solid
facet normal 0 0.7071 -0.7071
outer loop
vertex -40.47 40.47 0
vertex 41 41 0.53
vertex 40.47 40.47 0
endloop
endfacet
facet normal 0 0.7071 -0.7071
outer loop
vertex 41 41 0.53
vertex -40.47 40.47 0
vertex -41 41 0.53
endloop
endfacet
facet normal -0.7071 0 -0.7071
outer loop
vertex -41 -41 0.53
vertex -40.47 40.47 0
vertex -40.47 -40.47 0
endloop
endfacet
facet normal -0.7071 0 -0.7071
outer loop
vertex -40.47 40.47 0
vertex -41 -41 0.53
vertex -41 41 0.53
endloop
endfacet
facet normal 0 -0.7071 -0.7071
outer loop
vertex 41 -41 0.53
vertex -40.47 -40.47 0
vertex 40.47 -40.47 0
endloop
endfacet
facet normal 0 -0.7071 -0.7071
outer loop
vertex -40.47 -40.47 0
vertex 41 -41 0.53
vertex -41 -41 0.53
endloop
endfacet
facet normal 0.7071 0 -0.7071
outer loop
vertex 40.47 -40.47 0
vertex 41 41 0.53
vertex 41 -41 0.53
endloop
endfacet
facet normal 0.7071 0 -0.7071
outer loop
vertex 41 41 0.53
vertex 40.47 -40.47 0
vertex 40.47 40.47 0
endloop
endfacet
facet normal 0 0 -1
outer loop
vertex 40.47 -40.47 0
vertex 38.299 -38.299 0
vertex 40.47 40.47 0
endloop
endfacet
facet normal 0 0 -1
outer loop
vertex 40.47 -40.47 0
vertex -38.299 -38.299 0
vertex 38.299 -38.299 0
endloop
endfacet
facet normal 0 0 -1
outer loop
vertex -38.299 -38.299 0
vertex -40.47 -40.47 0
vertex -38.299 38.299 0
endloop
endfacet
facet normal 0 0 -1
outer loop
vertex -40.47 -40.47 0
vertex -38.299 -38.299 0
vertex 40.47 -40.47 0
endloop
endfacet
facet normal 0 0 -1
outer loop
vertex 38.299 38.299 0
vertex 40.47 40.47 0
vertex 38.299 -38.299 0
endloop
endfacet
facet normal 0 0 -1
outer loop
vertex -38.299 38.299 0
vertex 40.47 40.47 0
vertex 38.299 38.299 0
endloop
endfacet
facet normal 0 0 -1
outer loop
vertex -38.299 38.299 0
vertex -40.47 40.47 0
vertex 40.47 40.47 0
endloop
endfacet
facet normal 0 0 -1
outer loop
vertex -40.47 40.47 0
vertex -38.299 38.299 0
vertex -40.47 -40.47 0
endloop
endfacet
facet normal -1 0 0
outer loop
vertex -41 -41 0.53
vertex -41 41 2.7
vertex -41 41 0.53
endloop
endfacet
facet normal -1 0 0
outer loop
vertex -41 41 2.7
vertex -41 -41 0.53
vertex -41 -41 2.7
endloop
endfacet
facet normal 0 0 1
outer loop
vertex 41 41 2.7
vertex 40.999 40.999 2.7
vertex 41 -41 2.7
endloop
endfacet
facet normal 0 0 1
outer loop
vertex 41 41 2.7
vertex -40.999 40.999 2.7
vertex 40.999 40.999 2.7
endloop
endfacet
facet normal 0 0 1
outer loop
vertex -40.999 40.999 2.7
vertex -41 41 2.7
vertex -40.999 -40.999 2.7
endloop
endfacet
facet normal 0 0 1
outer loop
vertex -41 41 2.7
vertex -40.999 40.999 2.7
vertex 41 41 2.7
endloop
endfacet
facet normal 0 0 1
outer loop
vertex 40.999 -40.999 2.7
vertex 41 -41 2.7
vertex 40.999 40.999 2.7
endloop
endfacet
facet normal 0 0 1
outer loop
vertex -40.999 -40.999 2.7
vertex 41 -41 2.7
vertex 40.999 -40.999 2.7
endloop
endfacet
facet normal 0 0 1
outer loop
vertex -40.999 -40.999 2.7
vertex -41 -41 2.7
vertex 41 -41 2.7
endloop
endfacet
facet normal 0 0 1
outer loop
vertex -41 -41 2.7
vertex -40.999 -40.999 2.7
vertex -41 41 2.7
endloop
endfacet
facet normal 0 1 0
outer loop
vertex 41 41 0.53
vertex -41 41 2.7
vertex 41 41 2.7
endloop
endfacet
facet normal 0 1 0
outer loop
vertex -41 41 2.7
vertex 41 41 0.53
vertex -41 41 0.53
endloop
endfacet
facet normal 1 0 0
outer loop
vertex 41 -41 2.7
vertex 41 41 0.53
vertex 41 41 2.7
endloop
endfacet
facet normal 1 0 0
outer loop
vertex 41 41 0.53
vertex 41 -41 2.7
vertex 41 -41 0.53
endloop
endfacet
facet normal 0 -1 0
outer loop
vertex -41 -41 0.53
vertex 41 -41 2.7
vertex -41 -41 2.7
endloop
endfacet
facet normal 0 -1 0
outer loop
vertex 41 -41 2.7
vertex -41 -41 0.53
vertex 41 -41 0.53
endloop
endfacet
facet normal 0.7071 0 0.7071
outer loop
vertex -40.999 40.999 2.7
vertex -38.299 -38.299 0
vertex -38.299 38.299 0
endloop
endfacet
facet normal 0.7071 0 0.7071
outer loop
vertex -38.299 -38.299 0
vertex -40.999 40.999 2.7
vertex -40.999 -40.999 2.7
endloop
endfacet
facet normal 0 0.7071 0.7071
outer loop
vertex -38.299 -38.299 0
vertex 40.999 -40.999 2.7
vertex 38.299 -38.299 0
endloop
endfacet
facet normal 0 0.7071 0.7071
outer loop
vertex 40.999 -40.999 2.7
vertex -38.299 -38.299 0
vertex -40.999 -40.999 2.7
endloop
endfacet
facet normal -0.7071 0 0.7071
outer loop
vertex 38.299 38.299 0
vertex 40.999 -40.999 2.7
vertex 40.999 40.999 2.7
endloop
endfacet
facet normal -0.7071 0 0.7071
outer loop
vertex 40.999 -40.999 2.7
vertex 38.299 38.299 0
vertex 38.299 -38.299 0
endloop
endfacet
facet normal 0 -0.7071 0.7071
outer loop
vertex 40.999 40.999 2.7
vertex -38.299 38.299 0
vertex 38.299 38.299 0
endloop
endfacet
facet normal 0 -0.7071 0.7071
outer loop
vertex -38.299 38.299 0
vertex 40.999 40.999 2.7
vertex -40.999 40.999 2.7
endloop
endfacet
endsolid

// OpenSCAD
eps = 0.001;
width = 82;
thickness = 2.7;

difference() {
  linear_extrude(thickness)
    square(width, center=true);
  
  translate([0, 0, thickness+eps])
    scale([1, 1, -1])
      linear_extrude(width/2, scale=0)
        square(width, center=true);
  
  for (a = [0, 1, 2, 3])
    rotate([0, 0, a*90])
      translate([0, width/2])
        rotate([45, 0, 0])
          cube([200, 0.75, 0.75], center=true);
}
